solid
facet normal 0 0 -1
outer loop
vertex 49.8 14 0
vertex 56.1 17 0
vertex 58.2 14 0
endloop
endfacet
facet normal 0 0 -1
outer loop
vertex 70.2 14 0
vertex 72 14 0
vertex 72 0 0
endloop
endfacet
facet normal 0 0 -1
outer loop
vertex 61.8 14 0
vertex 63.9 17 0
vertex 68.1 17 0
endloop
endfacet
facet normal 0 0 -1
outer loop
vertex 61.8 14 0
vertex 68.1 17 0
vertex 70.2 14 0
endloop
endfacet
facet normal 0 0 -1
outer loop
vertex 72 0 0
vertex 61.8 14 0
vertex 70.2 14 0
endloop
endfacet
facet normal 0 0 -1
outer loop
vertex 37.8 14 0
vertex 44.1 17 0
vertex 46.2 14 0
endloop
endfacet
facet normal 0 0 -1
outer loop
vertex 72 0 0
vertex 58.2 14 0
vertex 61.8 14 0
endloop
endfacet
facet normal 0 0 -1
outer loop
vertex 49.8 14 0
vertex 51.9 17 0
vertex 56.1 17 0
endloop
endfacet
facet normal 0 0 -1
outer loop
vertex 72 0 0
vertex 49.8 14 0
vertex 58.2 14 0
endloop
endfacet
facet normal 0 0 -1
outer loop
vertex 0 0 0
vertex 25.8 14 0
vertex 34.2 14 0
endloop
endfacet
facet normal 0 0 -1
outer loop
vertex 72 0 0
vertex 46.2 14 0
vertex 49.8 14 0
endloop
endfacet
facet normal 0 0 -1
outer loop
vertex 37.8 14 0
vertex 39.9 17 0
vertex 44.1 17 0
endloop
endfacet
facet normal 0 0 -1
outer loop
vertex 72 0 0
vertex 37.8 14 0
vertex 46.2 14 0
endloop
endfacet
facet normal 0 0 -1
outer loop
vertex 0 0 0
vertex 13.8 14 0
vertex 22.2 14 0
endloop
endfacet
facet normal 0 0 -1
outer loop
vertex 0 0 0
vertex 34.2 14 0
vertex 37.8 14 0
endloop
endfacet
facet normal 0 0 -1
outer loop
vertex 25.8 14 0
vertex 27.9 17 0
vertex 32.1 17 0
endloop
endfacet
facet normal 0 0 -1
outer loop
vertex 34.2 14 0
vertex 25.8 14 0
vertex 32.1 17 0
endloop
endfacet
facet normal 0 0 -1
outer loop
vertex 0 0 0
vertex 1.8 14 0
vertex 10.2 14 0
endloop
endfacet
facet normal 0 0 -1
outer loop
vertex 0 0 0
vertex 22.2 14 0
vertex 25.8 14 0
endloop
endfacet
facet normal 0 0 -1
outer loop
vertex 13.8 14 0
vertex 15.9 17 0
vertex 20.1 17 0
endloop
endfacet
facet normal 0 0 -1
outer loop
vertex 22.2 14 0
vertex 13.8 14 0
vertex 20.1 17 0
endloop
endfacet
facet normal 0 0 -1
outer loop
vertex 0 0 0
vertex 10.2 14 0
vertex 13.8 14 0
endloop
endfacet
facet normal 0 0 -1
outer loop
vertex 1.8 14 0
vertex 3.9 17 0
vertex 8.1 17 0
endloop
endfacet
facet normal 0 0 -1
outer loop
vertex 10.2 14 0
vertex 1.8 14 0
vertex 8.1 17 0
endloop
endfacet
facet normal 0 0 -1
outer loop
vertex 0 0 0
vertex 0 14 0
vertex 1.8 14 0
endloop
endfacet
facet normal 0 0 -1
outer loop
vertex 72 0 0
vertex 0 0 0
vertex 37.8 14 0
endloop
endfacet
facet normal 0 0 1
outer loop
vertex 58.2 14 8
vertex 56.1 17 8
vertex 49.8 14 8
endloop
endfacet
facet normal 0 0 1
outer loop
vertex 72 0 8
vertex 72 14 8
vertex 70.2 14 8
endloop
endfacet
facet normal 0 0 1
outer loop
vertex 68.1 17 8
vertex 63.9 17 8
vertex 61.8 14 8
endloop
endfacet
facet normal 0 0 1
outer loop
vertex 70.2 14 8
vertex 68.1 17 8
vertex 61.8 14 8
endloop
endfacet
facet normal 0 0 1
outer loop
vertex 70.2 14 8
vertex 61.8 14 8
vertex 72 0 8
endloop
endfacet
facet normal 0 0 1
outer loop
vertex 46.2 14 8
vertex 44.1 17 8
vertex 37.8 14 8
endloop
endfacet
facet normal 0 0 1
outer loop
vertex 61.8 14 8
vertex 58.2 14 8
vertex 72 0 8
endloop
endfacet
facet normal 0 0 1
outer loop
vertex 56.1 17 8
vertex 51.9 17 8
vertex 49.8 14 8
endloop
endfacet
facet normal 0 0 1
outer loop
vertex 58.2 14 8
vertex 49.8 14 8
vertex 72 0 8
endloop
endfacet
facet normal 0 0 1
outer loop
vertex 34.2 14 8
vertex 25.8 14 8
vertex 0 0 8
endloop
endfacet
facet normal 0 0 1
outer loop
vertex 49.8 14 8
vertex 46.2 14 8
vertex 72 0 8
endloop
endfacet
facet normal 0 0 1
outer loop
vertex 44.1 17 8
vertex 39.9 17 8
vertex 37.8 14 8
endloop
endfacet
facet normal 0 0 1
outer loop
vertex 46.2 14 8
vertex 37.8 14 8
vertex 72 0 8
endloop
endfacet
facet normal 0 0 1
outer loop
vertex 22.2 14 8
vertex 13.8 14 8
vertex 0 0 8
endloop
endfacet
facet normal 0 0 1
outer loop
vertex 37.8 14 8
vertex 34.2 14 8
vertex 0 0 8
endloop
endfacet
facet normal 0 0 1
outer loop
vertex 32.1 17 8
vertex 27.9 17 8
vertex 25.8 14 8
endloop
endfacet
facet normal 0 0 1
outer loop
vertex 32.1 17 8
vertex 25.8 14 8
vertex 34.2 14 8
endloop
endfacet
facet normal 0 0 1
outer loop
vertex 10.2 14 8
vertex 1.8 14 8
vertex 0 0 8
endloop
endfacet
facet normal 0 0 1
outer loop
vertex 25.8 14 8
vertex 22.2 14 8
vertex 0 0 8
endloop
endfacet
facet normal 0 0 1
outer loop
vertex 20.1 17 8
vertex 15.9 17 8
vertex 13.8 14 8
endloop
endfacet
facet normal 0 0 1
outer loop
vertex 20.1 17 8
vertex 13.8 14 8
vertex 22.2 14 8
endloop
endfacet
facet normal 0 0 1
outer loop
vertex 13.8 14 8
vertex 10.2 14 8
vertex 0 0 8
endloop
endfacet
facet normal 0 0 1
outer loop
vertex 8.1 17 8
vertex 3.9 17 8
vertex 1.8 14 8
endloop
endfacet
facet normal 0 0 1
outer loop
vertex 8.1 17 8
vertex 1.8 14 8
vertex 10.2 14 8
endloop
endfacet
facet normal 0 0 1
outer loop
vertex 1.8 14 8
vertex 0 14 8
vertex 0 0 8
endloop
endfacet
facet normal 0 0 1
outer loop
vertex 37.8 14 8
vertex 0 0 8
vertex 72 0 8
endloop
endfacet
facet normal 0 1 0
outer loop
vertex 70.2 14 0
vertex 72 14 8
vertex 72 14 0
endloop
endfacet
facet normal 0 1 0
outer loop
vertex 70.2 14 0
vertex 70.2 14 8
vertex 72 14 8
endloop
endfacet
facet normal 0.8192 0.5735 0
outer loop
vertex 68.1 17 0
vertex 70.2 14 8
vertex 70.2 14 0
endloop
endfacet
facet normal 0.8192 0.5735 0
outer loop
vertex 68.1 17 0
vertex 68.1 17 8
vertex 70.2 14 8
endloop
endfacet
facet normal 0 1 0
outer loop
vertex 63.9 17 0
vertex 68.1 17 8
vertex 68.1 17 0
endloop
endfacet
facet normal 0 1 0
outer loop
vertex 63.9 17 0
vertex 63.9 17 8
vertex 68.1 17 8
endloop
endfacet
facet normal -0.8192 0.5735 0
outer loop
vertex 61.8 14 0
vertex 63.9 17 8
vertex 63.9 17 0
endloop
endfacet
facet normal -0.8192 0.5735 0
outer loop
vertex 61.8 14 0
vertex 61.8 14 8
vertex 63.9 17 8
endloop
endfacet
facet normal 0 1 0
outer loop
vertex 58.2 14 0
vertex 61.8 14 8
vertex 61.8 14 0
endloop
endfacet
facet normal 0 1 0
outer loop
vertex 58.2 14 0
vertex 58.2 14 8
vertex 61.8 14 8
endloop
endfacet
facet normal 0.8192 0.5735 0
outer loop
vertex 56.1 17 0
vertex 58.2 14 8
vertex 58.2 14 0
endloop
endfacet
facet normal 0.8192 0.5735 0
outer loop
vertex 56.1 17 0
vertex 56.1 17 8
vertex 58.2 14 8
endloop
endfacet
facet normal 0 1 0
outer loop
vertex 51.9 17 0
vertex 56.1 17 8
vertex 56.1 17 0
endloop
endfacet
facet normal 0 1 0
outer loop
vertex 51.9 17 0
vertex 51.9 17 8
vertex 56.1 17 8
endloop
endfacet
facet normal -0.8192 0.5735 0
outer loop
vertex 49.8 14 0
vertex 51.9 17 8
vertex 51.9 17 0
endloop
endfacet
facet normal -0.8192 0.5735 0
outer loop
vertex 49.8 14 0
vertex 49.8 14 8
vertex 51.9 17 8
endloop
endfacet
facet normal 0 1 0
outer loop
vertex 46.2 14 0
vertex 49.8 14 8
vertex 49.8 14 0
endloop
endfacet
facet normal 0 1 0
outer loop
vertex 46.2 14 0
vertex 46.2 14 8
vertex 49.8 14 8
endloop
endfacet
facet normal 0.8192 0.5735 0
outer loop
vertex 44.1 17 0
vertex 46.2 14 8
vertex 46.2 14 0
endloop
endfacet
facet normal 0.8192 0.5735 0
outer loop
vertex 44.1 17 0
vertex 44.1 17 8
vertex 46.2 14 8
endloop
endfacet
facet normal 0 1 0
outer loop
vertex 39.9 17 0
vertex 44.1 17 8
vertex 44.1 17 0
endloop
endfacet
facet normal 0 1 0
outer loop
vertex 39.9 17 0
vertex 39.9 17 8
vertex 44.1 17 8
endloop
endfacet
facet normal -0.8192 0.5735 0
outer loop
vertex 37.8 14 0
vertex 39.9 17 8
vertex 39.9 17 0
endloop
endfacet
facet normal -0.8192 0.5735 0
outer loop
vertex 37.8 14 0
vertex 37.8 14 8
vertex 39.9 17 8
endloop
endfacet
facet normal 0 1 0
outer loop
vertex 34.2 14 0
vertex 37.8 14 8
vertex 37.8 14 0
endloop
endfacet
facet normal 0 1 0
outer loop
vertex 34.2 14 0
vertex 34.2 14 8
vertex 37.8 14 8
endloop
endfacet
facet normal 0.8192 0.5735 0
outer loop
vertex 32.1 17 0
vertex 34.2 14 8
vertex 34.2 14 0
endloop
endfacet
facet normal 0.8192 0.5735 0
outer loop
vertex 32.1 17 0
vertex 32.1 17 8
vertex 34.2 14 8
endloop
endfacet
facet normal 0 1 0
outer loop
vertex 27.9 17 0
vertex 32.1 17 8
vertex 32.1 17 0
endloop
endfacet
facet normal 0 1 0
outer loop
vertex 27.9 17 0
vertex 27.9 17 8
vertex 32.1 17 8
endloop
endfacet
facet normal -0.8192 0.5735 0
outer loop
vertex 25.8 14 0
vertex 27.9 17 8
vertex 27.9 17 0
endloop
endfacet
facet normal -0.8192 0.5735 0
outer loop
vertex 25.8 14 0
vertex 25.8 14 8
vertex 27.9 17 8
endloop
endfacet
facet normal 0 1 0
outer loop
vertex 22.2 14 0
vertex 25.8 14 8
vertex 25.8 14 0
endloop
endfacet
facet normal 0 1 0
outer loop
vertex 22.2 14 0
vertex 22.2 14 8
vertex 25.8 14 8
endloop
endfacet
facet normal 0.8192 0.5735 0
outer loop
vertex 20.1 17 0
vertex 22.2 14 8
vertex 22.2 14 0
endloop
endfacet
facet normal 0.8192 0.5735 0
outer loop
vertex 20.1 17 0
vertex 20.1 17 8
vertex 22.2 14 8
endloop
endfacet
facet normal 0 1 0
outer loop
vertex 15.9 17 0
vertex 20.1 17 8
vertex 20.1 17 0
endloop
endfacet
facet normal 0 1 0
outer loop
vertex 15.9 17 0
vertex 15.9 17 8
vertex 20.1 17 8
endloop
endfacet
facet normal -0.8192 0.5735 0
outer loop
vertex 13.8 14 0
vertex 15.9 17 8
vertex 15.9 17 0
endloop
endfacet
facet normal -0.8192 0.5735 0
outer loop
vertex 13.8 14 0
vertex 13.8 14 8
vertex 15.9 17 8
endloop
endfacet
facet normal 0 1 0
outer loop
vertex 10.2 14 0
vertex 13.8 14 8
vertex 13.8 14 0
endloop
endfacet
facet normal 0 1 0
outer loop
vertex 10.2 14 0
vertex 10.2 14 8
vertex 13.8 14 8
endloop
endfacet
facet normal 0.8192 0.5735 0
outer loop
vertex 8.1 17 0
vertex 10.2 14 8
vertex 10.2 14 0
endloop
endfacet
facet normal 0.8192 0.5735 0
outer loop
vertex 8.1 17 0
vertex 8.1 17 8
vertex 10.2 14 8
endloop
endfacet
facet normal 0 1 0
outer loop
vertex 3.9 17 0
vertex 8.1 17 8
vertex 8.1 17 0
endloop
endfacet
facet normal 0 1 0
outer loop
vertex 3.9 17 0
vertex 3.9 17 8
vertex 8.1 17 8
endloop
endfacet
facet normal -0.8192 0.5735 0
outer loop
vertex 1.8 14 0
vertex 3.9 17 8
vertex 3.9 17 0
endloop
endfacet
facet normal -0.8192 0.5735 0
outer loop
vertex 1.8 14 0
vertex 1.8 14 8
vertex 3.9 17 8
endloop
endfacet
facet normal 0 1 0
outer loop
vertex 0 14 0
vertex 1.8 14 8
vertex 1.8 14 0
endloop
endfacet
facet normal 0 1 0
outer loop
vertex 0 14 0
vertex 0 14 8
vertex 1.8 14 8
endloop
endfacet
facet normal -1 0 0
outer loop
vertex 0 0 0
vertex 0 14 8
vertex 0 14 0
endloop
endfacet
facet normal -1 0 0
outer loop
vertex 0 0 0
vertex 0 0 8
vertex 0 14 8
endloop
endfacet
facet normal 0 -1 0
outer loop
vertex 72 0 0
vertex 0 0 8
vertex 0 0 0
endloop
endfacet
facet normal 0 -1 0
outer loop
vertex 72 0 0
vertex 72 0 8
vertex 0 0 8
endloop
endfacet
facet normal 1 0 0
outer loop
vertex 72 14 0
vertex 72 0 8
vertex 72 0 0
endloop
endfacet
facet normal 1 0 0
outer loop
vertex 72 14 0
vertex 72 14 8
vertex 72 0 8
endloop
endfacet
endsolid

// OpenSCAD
$fn = 32;

// ----------------------------------------------------------------------
// Gear rack: 6 teeth, pitch 12 mm
// ----------------------------------------------------------------------

// --- parameters (mm) ---
teeth = 6;                // number of teeth
pitch = 12;               // tooth pitch, X
root_w = 8.4;             // tooth width at the root
tip_w = 4.2;              // tooth width at the tip
base_h = 14;              // rack body height, Y
tooth_h = 3;              // tooth height above the body
plate_t = 8;              // rack width, Z (extrusion height)

rack_l = teeth * pitch;  // overall length
total_h = base_h + tooth_h;  // overall height

profile = [[0, 0], [72, 0], [72, 14], [70.2, 14], [68.1, 17], [63.9, 17], [61.8, 14], [58.2, 14], [56.1, 17], [51.9, 17], [49.8, 14], [46.2, 14], [44.1, 17], [39.9, 17], [37.8, 14], [34.2, 14], [32.1, 17], [27.9, 17], [25.8, 14], [22.2, 14], [20.1, 17], [15.9, 17], [13.8, 14], [10.2, 14], [8.1, 17], [3.9, 17], [1.8, 14], [0, 14]];  // primary outline, 28 points, counter clockwise

// --- the one profile operation ---
linear_extrude(height = plate_t) polygon(points = profile);
